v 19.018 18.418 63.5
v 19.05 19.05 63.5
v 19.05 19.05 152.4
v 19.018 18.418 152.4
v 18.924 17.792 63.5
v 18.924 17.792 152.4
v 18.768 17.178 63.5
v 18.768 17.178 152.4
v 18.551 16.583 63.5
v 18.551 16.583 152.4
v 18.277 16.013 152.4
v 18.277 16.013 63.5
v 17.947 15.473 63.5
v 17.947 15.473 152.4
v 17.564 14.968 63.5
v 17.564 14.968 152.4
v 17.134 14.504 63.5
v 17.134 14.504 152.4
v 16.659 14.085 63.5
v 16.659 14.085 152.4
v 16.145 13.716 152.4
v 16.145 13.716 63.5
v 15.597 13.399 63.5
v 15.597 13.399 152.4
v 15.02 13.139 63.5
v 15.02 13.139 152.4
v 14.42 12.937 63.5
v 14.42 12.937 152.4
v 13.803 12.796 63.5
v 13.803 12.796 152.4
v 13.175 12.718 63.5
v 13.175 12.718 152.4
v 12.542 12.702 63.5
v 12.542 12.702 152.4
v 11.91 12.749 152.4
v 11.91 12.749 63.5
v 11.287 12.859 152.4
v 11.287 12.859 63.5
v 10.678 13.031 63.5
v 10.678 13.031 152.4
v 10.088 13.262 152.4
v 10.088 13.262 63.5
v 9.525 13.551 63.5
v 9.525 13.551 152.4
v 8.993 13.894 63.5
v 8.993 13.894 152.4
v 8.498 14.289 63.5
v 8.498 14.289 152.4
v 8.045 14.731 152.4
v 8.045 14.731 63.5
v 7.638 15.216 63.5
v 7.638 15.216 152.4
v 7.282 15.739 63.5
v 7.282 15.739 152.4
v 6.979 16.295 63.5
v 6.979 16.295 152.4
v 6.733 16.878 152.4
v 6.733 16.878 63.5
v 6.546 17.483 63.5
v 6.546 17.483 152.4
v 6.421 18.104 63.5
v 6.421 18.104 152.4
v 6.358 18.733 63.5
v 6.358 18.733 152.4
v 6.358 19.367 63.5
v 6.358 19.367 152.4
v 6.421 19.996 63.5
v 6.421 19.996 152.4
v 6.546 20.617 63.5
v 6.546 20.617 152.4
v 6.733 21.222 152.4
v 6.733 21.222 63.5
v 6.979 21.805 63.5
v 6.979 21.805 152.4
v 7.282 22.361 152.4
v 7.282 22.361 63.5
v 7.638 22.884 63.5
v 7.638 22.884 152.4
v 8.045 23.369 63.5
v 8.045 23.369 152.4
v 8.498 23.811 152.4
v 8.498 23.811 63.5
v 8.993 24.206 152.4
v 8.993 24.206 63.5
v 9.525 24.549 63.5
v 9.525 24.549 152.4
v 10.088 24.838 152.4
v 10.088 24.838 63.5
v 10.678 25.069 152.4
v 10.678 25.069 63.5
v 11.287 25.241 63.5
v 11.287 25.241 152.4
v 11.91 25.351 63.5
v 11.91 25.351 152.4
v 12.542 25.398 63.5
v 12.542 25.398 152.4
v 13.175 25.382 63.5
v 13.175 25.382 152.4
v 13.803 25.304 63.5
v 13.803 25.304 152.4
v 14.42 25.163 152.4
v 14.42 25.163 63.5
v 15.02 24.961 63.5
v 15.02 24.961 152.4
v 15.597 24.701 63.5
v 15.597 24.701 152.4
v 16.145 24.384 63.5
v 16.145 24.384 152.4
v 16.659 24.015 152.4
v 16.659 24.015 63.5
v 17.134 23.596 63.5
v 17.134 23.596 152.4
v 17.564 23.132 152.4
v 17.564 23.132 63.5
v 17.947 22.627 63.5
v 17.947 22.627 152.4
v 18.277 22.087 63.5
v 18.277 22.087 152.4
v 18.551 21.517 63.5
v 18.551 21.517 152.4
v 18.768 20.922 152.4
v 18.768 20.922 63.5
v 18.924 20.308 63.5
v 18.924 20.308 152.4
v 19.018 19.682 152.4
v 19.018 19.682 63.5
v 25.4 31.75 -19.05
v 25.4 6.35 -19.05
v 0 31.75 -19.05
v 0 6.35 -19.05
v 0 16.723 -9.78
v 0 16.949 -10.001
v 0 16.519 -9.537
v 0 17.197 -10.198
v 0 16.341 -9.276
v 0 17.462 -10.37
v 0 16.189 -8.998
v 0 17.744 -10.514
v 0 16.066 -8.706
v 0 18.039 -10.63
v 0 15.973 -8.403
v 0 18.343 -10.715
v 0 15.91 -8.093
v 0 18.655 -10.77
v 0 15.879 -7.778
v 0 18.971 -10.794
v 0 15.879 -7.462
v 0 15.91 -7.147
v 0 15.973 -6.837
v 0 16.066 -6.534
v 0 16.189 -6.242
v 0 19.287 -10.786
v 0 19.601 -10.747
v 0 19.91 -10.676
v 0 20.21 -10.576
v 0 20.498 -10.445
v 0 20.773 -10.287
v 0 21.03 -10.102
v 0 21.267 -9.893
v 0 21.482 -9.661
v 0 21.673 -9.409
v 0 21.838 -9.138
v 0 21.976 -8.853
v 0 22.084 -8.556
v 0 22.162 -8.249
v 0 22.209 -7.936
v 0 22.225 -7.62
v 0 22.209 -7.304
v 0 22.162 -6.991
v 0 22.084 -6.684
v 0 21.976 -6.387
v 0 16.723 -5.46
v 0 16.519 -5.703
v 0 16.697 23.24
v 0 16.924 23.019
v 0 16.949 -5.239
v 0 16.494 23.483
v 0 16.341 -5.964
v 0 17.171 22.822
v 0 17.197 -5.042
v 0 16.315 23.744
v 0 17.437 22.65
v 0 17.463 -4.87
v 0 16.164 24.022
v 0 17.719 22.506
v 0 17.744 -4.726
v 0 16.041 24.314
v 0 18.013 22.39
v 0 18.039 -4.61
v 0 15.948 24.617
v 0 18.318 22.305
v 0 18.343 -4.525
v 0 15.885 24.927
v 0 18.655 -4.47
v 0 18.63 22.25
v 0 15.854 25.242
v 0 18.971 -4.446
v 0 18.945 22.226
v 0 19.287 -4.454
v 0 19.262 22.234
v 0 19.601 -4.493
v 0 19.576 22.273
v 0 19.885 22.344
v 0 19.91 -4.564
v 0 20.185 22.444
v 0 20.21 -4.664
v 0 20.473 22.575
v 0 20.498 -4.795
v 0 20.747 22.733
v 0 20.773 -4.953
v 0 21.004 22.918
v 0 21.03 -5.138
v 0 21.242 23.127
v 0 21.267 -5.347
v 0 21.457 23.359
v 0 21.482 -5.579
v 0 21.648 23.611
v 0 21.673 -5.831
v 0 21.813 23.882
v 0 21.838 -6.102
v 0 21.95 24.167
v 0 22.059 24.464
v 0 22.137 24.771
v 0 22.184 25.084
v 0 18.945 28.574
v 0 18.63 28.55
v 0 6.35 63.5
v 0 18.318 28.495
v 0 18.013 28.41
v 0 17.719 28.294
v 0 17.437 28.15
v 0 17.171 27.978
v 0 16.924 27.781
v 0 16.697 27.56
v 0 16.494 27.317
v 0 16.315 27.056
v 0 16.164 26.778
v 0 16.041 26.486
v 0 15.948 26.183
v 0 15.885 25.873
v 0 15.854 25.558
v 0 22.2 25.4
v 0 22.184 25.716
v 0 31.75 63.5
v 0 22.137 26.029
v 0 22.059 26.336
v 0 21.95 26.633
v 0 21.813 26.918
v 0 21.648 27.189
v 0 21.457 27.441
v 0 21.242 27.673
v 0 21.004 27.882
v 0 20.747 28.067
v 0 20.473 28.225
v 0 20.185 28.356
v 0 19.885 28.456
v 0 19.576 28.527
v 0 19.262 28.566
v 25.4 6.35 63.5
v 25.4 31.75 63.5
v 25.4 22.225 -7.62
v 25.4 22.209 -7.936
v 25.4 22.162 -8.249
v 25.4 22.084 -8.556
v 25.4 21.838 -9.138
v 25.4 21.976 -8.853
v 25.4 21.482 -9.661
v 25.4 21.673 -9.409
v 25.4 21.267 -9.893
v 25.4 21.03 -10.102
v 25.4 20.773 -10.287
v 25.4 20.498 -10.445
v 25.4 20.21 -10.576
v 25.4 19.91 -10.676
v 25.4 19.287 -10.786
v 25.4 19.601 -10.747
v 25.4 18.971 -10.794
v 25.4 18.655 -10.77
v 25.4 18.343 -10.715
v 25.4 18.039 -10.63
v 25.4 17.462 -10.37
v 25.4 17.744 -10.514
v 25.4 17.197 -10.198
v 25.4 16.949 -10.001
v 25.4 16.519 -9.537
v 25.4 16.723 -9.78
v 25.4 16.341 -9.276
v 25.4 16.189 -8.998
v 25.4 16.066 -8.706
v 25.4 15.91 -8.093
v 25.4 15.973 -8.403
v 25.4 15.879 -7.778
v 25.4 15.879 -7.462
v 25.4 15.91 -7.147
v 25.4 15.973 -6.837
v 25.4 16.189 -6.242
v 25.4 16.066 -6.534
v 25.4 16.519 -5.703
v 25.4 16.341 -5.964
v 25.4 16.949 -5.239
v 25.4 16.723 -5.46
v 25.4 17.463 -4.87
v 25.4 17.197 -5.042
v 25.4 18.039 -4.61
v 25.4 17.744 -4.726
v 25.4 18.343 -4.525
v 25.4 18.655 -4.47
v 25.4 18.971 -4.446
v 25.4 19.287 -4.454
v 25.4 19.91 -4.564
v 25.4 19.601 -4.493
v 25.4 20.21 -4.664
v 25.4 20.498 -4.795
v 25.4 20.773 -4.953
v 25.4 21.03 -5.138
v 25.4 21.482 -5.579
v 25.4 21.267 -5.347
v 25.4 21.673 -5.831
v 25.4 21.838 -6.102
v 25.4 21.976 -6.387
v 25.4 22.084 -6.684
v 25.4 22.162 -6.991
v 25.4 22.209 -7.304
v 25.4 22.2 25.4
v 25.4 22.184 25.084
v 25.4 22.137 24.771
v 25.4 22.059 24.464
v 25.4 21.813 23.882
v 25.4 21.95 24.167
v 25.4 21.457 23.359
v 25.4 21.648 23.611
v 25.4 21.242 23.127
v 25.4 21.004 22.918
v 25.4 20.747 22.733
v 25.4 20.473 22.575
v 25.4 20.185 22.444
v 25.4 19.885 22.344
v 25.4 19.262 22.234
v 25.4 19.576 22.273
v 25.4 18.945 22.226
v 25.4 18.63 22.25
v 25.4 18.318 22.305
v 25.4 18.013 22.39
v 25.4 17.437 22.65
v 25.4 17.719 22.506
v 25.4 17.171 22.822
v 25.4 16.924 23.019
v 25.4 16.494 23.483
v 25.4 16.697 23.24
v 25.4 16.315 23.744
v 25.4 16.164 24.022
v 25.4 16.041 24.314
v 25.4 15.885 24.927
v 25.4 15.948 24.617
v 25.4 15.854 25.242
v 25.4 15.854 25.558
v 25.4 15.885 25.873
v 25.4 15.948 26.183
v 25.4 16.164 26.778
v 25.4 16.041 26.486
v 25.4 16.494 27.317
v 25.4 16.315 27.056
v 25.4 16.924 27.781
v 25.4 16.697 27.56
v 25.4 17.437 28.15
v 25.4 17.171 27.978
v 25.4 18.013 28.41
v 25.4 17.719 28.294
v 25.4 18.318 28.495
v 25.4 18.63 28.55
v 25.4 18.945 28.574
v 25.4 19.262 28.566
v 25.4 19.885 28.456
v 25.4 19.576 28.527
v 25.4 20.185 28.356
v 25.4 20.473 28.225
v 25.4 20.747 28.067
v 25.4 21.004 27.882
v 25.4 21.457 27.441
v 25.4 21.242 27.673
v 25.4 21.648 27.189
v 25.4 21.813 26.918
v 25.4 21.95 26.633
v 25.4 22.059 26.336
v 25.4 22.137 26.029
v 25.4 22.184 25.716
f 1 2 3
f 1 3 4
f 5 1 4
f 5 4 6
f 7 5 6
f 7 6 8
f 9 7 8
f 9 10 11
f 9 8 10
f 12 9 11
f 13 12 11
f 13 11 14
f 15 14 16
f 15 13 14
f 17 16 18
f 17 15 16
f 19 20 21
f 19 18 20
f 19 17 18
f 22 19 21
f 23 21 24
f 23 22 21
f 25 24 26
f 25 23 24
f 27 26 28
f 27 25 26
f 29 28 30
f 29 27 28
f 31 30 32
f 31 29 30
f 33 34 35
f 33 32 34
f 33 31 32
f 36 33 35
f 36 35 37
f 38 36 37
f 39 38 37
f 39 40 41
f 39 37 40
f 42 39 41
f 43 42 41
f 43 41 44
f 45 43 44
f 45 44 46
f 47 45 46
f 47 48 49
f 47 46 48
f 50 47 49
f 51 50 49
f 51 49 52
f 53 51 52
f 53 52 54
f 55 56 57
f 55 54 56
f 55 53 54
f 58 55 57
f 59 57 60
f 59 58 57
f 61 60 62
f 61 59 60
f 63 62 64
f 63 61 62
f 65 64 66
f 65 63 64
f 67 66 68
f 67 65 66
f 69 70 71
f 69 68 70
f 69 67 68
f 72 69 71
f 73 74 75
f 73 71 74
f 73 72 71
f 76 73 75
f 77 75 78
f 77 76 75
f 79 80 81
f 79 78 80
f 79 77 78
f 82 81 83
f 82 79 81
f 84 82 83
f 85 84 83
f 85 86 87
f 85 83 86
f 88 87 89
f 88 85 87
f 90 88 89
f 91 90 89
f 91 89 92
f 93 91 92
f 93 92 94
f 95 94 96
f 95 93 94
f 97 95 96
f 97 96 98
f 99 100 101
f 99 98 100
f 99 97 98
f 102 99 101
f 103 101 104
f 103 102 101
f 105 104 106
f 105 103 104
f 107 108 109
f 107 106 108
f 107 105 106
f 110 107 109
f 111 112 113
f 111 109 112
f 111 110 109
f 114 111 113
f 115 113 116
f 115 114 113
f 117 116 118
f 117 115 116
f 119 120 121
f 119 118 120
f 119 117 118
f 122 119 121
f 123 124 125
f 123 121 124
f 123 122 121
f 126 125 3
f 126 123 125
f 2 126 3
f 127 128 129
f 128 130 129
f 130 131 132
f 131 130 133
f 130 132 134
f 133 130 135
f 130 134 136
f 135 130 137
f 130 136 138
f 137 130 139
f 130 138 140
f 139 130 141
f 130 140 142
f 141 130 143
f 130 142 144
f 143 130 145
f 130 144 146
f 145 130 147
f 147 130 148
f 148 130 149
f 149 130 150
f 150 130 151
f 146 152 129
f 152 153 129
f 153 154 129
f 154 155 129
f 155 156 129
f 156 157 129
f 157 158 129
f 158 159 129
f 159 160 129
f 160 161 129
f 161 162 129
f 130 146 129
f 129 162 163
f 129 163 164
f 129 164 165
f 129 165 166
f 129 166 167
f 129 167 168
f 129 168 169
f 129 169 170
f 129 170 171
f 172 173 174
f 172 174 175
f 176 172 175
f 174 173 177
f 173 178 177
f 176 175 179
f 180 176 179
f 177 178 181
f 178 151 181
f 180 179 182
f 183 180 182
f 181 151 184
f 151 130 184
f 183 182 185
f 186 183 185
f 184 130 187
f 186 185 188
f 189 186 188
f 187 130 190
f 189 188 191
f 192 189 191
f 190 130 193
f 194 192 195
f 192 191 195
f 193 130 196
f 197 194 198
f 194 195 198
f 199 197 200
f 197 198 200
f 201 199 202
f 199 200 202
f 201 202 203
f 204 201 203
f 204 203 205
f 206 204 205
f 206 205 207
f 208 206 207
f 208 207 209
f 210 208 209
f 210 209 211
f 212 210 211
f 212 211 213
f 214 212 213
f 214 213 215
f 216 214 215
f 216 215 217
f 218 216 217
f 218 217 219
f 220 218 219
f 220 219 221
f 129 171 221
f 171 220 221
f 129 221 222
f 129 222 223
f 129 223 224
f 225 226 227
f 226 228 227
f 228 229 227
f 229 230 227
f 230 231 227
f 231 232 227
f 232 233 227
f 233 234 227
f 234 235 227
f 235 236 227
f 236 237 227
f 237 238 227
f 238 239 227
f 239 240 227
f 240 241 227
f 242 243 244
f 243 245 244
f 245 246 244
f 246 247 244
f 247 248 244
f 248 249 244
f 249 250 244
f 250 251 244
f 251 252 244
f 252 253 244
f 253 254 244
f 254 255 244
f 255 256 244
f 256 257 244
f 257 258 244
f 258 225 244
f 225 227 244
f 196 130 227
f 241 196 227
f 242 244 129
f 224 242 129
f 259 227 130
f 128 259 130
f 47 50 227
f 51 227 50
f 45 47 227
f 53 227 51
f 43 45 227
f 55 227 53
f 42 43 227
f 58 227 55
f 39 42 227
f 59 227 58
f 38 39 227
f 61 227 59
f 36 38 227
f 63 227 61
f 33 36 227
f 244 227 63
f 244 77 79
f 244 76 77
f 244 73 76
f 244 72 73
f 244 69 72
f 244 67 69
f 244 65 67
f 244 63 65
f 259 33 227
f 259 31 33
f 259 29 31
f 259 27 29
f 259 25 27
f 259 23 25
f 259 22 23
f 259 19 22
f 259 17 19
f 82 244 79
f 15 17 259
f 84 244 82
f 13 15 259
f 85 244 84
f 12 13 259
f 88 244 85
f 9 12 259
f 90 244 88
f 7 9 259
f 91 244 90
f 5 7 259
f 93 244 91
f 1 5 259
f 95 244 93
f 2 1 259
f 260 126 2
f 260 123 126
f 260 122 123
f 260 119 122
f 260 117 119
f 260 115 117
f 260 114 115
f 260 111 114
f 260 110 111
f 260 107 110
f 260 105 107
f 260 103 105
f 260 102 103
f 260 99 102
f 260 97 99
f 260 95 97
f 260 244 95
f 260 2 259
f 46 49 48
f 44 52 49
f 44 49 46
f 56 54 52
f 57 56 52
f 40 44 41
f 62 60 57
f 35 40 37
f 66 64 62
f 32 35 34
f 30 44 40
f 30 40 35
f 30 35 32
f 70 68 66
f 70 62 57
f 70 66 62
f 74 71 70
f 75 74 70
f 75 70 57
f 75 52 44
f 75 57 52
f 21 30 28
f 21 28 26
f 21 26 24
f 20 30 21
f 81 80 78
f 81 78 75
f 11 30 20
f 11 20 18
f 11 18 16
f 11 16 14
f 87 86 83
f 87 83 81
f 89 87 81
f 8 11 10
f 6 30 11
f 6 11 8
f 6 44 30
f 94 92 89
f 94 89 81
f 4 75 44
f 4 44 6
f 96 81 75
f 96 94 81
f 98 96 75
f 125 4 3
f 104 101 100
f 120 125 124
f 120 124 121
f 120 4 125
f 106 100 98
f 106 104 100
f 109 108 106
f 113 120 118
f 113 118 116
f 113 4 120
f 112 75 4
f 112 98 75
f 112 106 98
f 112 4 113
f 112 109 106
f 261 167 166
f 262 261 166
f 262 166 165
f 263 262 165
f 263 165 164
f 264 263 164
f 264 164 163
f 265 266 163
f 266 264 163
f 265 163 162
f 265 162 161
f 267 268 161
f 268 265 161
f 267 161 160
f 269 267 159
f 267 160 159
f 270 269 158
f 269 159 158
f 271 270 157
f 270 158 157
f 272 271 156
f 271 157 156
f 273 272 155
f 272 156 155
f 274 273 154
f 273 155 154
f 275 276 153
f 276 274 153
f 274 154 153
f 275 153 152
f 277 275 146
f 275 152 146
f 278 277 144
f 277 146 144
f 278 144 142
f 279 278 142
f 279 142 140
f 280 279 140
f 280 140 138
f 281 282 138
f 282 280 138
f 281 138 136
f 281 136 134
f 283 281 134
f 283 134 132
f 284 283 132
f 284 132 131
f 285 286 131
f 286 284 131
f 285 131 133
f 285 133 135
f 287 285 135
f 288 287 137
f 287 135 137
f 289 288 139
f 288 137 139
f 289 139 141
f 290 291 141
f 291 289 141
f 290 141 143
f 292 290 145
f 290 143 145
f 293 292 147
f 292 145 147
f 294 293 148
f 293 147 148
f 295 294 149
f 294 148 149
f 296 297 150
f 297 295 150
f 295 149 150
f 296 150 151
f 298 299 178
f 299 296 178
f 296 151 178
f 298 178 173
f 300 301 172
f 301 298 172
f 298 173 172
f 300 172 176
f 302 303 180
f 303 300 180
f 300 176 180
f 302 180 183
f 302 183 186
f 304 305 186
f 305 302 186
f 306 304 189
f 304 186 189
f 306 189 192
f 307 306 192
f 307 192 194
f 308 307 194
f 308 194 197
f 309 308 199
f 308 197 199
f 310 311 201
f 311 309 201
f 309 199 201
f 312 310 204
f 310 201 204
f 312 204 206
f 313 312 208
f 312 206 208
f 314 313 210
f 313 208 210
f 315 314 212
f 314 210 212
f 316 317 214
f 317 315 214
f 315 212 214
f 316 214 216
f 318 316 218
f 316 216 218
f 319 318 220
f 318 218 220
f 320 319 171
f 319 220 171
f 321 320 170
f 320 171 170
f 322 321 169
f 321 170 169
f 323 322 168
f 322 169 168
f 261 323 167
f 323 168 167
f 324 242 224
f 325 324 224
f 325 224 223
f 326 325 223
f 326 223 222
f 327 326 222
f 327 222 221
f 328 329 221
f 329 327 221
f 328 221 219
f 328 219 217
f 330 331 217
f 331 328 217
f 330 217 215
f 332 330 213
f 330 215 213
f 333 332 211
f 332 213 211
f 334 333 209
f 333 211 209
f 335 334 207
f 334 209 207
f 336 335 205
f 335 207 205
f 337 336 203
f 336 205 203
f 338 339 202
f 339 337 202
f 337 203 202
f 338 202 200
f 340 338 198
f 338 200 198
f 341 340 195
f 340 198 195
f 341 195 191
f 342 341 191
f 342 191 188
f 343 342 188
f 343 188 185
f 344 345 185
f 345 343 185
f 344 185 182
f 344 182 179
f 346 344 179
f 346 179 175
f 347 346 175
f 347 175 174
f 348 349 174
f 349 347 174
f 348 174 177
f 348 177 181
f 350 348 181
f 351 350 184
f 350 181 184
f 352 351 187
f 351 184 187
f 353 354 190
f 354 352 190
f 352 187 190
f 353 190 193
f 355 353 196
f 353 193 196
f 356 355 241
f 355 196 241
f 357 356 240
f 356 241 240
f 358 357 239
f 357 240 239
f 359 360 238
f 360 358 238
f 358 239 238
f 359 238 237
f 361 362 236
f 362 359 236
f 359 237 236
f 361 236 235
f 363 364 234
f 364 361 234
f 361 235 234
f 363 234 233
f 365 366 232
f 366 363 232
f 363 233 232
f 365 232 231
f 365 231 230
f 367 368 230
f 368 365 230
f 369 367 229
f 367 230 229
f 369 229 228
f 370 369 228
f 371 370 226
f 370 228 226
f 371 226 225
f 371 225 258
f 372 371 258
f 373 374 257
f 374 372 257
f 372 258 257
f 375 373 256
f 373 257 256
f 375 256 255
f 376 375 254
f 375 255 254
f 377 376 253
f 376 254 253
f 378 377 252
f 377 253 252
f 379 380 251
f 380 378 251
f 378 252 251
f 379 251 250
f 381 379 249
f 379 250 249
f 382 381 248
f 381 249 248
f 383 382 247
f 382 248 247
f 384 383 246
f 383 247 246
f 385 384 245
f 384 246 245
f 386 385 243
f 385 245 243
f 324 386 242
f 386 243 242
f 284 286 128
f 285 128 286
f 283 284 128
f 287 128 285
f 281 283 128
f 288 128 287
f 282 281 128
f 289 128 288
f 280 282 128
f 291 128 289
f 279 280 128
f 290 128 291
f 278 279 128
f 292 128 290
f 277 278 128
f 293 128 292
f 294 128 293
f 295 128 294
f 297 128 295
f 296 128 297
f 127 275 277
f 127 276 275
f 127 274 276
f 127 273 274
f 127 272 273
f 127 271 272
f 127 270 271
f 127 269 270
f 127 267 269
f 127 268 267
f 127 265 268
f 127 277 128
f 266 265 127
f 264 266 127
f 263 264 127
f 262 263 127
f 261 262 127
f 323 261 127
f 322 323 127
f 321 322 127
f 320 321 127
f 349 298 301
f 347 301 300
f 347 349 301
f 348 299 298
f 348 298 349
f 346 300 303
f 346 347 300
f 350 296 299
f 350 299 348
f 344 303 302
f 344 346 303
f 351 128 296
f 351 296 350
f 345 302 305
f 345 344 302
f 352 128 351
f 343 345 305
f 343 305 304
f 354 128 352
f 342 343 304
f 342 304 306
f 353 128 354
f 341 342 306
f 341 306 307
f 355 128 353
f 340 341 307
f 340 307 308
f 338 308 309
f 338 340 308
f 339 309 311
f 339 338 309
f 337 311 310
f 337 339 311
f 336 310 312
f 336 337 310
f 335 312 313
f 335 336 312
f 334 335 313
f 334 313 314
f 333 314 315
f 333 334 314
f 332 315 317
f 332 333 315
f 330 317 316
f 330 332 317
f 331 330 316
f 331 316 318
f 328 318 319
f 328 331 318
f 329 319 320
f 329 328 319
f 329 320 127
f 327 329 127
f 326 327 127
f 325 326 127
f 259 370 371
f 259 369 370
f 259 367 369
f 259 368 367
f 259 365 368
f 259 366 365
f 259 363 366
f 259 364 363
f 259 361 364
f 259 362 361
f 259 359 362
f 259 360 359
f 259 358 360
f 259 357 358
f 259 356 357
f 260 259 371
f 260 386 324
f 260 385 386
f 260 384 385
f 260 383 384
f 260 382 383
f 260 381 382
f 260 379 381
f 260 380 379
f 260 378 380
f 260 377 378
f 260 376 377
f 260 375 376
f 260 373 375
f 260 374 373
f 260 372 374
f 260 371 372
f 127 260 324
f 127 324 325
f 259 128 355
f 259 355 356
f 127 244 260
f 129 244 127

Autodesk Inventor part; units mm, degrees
ref_plane "YZ Plane" through (0, 0, 0) normal (1, 0, 0) x (0, 1, 0)
ref_plane "XZ Plane" through (0, 0, 0) normal (0, 1, 0) x (-1, 0, 0)
ref_plane "XY Plane" through (0, 0, 0) normal (0, 0, 1) x (1, 0, 0)
sketch "Sketch1" plane through (0, 0, 0) normal (1, 0, 0) x (0, 1, 0)
  line L0 (31.75, 38.1) -> (6.35, 38.1)
  line L1 (6.35, 38.1) -> (6.35, -19.05)
  line L2 (6.35, -19.05) -> (31.75, -19.05)
  circle A0 centre (19.0246, 25.4) radius 3.175
  line L3 (0, 0) -> (6.35, 0)
  line L4 (0, 14.2875) -> (0, -6.35)
  circle A1 centre (19.05, -7.62) radius 3.175
  line L5 (31.75, 38.1) -> (31.75, -25.4)
  point P0 (31.75, -19.05)
  dimension "d0" = 57.15
  dimension "d1" = 38.1
  dimension "d2" = 25.4
  dimension "d3" = 31.75
  dimension "d4" = 6.35
  dimension "d7" = 6.35
  dimension "d8" = 33.02
extrude "Extrusion1" add sketch "Sketch1" along normal blind 25.4
sketch "Sketch2" plane through (0, 6.35, 38.1) normal (0, 0, 1) x (1, 0, 0)
  line L0 (0, 25.4) -> (25.4, 25.4) projected
  line L1 (25.4, 0) -> (0, 0)
  line L2 (0, 0) -> (0, 25.4)
  line L3 (0, 25.4) -> (25.4, 25.4)
  line L4 (25.4, 25.4) -> (25.4, 0)
  point P0 (0, -6.35)
extrude "Extrusion2" add sketch "Sketch2" along normal blind 25.4
sketch "Sketch3" plane through (0, 6.35, 63.5) normal (0, 0, 1) x (1, 0, 0)
  circle A0 centre (12.7, 12.7) radius 6.35
  point P0 (0, -6.35)
  dimension "d18" = 12.7
extrude "Extrusion3" add sketch "Sketch3" along normal blind 88.9
properties part number "Base"
